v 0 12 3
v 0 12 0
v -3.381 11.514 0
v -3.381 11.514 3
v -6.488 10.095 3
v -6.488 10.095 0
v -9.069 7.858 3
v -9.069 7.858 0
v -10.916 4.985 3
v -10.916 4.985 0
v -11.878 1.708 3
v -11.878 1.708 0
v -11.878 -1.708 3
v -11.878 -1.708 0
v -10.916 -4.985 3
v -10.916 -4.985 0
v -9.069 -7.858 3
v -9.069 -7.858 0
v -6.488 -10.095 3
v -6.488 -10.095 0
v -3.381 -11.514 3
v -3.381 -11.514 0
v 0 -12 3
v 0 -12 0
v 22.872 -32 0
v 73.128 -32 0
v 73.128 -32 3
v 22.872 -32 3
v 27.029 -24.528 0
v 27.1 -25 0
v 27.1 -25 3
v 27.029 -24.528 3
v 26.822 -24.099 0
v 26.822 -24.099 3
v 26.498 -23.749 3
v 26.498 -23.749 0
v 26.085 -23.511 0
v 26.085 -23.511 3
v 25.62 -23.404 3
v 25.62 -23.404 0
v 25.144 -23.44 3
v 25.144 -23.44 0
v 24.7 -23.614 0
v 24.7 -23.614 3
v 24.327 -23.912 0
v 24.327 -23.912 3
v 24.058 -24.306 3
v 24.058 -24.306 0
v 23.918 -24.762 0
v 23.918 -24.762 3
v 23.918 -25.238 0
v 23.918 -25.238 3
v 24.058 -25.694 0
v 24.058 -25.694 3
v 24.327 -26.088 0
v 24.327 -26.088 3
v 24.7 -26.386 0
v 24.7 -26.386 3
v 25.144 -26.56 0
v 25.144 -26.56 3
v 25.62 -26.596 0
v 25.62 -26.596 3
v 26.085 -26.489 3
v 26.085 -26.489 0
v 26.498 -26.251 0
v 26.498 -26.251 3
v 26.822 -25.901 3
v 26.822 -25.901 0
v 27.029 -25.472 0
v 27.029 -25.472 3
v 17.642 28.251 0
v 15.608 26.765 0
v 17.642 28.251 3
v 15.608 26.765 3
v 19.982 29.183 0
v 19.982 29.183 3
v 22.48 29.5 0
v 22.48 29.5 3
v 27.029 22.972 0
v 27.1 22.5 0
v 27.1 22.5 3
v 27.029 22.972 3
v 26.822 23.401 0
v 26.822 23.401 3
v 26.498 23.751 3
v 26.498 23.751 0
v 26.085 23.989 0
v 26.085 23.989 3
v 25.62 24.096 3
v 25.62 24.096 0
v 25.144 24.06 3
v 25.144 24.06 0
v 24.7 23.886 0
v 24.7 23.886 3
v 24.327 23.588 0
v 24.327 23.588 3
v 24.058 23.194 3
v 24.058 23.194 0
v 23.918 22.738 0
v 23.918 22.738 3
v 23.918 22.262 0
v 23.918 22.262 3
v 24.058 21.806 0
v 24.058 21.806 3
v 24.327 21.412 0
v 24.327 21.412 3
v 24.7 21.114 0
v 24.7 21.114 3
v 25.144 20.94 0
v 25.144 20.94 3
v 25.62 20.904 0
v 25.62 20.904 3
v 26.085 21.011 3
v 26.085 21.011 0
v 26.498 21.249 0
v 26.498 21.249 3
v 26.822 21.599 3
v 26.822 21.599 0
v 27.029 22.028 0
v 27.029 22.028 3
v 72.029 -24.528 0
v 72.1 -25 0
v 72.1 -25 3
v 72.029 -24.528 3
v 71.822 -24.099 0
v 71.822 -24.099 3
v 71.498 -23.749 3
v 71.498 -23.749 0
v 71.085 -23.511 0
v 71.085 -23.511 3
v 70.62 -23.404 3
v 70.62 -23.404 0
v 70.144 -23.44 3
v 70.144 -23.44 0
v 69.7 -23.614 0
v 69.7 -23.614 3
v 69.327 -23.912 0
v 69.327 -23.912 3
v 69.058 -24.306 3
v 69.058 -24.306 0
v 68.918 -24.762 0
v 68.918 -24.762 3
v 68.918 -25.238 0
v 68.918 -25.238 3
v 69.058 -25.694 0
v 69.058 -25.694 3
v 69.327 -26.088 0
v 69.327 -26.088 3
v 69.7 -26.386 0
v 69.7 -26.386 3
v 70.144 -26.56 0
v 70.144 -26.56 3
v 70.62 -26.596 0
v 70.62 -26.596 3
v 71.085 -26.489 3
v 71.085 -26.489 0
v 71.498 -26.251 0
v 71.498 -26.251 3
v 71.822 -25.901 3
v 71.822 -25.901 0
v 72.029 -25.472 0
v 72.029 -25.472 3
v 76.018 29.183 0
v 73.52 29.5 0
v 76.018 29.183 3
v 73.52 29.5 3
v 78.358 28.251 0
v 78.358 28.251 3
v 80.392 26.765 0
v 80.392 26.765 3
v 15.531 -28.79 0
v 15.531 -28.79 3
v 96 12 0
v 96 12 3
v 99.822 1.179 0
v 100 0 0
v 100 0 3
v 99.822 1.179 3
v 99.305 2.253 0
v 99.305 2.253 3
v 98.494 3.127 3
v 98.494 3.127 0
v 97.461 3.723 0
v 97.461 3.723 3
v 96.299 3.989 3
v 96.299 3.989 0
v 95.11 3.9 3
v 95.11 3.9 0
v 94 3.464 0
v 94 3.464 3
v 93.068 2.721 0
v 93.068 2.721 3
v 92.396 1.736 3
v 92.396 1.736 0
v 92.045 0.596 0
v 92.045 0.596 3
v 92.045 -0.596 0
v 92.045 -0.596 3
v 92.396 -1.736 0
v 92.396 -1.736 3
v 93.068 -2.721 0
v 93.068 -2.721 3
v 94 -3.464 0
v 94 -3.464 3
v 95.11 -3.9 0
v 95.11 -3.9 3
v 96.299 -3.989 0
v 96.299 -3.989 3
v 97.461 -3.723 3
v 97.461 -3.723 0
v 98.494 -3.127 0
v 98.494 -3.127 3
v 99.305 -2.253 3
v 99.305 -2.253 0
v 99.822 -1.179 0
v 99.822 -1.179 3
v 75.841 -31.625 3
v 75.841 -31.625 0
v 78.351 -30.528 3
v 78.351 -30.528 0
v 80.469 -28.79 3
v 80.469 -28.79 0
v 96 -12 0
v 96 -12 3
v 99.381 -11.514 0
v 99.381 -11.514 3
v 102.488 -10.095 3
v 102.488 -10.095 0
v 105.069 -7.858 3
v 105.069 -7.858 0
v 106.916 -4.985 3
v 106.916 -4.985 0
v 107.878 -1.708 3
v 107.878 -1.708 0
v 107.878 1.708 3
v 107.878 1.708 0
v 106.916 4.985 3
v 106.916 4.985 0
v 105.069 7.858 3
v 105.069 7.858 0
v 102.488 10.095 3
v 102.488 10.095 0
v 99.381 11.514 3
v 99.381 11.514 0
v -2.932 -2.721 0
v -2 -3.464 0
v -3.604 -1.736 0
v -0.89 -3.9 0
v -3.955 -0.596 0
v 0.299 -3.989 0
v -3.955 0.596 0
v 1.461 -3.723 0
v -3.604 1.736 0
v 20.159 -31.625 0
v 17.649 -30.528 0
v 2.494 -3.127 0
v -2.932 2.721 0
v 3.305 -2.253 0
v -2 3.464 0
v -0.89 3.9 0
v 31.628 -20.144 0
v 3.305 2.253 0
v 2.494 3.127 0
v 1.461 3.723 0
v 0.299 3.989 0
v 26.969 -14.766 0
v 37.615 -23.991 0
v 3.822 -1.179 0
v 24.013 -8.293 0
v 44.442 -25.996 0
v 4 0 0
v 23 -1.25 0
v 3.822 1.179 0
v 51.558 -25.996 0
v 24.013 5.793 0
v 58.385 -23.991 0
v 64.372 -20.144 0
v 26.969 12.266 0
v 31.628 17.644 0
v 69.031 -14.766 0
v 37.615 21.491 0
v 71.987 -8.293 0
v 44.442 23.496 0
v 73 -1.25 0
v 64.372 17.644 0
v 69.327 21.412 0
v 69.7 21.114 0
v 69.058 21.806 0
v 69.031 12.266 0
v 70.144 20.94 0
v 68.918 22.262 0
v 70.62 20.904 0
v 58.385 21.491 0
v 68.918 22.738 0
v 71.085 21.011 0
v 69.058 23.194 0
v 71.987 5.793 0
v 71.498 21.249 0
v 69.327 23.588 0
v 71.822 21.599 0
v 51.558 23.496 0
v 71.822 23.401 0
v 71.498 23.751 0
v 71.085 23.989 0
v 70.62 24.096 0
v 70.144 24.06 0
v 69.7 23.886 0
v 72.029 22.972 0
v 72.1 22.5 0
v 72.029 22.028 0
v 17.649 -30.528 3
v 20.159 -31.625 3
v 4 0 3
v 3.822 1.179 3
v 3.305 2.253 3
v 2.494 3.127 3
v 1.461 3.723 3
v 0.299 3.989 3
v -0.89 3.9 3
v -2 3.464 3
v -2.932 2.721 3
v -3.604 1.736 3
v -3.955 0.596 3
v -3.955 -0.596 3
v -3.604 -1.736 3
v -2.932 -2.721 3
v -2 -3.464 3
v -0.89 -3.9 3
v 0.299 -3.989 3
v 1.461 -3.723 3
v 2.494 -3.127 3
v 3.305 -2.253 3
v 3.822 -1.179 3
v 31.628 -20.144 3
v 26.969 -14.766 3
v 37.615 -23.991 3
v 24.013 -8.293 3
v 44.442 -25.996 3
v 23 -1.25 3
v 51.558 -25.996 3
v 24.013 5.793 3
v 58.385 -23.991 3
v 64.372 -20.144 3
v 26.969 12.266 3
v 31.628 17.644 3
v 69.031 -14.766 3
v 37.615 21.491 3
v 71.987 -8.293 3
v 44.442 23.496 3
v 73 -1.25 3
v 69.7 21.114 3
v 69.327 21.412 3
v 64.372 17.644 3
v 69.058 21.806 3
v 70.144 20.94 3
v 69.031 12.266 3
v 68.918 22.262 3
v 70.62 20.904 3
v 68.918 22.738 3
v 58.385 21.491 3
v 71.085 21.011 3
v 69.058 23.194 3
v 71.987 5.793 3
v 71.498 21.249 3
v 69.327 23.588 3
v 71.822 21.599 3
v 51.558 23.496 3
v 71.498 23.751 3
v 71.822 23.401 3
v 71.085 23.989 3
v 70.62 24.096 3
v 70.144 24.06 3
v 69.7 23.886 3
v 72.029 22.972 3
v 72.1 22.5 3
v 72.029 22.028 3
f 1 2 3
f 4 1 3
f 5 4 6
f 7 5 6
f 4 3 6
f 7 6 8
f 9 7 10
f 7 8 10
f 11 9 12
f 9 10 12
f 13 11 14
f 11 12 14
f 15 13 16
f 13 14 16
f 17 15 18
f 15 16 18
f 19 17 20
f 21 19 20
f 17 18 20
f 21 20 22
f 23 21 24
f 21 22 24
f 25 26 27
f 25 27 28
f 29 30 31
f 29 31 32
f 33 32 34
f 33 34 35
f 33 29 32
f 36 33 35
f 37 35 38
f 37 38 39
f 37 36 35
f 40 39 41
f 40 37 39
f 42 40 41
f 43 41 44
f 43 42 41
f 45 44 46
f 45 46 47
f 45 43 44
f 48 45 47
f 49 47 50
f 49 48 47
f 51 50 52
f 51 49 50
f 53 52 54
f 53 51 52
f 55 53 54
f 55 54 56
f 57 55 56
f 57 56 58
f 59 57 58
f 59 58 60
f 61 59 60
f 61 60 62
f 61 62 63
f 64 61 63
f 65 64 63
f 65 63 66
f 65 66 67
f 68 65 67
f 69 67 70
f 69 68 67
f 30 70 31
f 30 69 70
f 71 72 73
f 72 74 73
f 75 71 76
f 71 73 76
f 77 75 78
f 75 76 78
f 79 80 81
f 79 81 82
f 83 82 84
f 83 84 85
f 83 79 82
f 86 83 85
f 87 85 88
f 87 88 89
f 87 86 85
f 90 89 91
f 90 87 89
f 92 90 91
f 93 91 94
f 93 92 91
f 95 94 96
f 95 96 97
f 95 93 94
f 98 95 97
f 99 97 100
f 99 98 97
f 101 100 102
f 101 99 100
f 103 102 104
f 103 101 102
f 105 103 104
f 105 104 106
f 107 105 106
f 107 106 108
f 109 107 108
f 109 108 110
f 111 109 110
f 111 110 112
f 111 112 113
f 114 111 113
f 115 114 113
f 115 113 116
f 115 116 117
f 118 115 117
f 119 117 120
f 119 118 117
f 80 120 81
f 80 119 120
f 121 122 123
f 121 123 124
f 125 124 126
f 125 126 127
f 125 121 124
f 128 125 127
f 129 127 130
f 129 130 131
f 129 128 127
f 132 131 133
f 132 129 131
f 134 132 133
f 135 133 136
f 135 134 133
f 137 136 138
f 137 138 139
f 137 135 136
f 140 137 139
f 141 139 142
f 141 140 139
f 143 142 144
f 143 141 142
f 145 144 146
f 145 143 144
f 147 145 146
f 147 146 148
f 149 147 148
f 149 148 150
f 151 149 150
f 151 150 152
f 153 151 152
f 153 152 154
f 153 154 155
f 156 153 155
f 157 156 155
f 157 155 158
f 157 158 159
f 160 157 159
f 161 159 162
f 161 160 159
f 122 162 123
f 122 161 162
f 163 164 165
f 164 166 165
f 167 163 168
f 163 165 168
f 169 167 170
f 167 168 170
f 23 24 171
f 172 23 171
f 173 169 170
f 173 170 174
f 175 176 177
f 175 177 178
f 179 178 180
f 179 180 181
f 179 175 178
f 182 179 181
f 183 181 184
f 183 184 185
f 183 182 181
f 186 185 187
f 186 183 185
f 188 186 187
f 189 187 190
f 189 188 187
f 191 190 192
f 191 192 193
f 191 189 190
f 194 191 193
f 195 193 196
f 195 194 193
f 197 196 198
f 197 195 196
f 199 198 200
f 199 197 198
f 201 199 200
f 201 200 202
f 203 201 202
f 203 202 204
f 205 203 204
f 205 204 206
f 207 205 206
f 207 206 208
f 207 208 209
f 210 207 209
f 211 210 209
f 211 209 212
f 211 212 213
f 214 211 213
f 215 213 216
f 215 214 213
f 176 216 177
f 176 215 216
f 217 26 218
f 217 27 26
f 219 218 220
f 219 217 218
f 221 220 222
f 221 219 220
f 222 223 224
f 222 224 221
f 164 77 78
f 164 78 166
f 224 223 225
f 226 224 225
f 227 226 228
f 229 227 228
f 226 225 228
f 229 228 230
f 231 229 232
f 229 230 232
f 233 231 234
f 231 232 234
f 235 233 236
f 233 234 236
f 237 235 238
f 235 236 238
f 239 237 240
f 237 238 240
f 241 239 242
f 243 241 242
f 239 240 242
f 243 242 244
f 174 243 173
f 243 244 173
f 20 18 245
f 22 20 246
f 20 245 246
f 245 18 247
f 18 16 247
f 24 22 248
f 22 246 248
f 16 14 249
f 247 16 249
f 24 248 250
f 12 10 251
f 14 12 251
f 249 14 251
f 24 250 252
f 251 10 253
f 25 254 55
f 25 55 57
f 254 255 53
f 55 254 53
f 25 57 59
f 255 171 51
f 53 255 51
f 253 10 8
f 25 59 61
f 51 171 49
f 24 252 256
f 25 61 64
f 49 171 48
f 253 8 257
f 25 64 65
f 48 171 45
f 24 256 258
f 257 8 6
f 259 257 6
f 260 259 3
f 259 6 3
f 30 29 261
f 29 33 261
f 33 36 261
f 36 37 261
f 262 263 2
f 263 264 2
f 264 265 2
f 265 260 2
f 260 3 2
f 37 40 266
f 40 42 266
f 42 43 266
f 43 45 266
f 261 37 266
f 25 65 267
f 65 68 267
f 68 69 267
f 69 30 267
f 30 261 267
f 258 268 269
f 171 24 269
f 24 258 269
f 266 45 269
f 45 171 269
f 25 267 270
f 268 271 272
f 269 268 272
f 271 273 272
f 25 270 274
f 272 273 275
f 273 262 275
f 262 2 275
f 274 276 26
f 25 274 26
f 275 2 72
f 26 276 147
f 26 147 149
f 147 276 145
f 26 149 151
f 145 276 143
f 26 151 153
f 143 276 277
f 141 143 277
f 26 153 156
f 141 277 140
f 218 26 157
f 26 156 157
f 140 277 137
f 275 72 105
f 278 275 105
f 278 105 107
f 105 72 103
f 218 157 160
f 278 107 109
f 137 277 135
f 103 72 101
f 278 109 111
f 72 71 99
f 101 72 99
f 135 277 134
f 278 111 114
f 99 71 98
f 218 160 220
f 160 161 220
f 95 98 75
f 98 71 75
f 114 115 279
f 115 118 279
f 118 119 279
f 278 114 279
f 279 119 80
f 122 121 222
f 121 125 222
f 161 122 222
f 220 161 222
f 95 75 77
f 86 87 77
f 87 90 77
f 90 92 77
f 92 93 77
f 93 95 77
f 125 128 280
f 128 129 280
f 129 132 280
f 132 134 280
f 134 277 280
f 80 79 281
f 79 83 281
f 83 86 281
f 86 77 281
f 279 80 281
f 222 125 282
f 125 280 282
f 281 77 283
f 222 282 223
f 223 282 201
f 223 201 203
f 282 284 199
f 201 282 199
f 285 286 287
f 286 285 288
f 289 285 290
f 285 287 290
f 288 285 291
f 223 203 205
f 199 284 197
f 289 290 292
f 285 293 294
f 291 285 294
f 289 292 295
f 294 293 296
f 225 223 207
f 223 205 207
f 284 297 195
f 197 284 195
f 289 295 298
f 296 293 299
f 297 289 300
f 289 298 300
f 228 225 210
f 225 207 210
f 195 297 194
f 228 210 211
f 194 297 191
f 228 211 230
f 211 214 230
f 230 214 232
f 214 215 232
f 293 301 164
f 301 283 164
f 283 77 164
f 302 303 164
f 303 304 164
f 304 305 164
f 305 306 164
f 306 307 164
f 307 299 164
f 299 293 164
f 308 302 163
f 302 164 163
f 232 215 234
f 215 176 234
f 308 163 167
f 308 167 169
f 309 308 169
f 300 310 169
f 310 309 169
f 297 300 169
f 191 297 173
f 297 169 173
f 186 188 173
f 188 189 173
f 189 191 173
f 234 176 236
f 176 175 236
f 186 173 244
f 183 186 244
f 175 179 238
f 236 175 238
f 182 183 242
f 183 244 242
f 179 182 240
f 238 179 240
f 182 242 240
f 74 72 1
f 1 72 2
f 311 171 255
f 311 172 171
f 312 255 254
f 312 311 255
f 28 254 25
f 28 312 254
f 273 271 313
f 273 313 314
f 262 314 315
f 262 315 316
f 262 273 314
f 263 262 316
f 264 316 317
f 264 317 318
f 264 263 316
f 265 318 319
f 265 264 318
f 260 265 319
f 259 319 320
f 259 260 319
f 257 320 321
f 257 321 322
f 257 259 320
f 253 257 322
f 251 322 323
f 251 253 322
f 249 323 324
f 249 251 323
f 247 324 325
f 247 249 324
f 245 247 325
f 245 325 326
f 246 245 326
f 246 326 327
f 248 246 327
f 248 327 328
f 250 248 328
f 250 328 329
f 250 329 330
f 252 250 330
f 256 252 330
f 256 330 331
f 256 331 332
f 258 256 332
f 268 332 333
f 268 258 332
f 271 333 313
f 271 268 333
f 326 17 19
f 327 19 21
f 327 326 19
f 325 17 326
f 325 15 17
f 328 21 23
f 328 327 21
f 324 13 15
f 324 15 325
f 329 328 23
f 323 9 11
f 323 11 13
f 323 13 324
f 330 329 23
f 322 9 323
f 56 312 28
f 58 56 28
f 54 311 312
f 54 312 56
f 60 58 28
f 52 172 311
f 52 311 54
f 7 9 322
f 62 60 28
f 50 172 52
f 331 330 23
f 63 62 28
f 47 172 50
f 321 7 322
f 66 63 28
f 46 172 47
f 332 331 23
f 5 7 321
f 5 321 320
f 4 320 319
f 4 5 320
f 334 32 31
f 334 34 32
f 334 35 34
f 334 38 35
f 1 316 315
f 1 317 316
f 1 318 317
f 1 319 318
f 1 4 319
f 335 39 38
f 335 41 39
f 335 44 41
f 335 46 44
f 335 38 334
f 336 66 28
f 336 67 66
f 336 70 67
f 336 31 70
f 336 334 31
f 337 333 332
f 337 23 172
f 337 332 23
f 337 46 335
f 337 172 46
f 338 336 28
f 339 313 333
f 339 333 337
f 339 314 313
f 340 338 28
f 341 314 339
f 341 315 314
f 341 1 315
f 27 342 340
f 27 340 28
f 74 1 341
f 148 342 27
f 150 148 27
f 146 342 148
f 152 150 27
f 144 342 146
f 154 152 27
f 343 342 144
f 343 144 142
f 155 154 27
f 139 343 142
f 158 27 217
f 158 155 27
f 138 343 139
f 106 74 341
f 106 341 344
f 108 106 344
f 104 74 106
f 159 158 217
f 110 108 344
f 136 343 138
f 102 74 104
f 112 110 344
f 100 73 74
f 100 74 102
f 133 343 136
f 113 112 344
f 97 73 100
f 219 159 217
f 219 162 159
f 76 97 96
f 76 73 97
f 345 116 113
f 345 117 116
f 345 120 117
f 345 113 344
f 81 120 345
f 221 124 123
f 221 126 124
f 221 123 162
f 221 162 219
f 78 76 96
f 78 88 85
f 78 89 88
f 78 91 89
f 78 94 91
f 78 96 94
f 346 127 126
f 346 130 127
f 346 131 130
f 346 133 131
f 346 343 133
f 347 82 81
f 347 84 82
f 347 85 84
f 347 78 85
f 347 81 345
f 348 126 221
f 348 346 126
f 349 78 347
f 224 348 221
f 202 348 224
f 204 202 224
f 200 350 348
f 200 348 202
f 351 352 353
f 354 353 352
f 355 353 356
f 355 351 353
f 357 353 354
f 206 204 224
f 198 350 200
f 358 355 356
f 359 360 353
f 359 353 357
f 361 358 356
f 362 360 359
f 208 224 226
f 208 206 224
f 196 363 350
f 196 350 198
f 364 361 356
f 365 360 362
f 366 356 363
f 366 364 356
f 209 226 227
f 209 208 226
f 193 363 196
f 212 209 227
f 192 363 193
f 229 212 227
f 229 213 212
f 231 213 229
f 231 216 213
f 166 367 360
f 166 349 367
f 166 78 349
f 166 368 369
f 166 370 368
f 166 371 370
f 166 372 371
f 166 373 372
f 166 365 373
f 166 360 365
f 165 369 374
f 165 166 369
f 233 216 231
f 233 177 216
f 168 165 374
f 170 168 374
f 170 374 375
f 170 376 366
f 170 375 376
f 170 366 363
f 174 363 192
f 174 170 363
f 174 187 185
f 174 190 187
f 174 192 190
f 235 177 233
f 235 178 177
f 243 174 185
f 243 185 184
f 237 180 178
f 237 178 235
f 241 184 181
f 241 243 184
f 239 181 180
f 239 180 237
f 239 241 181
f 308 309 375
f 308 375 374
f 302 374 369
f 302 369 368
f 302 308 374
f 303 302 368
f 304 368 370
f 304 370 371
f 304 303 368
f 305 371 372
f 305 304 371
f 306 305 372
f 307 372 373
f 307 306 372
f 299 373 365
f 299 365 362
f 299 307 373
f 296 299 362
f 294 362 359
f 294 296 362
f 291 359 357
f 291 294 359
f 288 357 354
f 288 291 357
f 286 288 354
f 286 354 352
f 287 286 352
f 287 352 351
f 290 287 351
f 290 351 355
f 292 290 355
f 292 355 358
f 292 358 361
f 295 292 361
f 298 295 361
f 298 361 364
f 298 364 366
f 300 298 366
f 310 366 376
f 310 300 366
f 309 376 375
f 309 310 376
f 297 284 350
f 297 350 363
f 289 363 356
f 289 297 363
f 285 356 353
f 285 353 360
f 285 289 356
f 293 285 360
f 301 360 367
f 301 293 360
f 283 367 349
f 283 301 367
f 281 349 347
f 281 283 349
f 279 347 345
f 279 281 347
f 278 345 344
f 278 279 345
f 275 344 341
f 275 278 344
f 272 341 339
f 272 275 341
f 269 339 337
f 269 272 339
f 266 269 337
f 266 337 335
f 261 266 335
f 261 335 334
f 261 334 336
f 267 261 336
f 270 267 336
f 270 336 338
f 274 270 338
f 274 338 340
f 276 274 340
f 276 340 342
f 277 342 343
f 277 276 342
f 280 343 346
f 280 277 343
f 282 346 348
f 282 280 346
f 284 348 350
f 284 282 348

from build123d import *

# Parameters (mm, degrees)
SKETCH_R   = 4
SKETCH_R_2 = 1.6
SKETCH_R_3 = 25
PAD_DEPTH  = 3
FILLET_R   = 10


with BuildPart() as part:
    # Sketch → Pad (new body)
    with BuildSketch(Plane.XY):
        with BuildLine():
            ThreePointArc((0, 12), (-12, 0), (0, -12))
            Line((0, -12), (18.5, -32))
            Line((77.5, -32), (18.5, -32))
            Line((96, -12), (77.5, -32))
            ThreePointArc((96, -12), (108, 0), (96, 12))
            Line((77.5, 29.5), (96, 12))
            Line((18.5, 29.5), (77.5, 29.5))
            Line((18.5, 29.5), (0, 12))
        make_face()
        Circle(SKETCH_R, mode=Mode.SUBTRACT)
        with Locations((96, 0)):
            Circle(SKETCH_R, mode=Mode.SUBTRACT)
        with Locations((25.5, -25)):
            Circle(SKETCH_R_2, mode=Mode.SUBTRACT)
        with Locations((70.5, -25)):
            Circle(SKETCH_R_2, mode=Mode.SUBTRACT)
        with Locations((25.5, 22.5)):
            Circle(SKETCH_R_2, mode=Mode.SUBTRACT)
        with Locations((70.5, 22.5)):
            Circle(SKETCH_R_2, mode=Mode.SUBTRACT)
        with Locations((48, -1.25)):
            Circle(SKETCH_R_3, mode=Mode.SUBTRACT)
    extrude(amount=PAD_DEPTH)

    # Fillet
    fillet_edges = [part.edges().sort_by_distance(p)[0] for p in [
        (77.5, -32, 1.5),
        (18.5, -32, 1.5),
        (77.5, 29.5, 1.5),
        (18.5, 29.5, 1.5),
    ]]
    fillet(fillet_edges, radius=FILLET_R)


solid = part.part
